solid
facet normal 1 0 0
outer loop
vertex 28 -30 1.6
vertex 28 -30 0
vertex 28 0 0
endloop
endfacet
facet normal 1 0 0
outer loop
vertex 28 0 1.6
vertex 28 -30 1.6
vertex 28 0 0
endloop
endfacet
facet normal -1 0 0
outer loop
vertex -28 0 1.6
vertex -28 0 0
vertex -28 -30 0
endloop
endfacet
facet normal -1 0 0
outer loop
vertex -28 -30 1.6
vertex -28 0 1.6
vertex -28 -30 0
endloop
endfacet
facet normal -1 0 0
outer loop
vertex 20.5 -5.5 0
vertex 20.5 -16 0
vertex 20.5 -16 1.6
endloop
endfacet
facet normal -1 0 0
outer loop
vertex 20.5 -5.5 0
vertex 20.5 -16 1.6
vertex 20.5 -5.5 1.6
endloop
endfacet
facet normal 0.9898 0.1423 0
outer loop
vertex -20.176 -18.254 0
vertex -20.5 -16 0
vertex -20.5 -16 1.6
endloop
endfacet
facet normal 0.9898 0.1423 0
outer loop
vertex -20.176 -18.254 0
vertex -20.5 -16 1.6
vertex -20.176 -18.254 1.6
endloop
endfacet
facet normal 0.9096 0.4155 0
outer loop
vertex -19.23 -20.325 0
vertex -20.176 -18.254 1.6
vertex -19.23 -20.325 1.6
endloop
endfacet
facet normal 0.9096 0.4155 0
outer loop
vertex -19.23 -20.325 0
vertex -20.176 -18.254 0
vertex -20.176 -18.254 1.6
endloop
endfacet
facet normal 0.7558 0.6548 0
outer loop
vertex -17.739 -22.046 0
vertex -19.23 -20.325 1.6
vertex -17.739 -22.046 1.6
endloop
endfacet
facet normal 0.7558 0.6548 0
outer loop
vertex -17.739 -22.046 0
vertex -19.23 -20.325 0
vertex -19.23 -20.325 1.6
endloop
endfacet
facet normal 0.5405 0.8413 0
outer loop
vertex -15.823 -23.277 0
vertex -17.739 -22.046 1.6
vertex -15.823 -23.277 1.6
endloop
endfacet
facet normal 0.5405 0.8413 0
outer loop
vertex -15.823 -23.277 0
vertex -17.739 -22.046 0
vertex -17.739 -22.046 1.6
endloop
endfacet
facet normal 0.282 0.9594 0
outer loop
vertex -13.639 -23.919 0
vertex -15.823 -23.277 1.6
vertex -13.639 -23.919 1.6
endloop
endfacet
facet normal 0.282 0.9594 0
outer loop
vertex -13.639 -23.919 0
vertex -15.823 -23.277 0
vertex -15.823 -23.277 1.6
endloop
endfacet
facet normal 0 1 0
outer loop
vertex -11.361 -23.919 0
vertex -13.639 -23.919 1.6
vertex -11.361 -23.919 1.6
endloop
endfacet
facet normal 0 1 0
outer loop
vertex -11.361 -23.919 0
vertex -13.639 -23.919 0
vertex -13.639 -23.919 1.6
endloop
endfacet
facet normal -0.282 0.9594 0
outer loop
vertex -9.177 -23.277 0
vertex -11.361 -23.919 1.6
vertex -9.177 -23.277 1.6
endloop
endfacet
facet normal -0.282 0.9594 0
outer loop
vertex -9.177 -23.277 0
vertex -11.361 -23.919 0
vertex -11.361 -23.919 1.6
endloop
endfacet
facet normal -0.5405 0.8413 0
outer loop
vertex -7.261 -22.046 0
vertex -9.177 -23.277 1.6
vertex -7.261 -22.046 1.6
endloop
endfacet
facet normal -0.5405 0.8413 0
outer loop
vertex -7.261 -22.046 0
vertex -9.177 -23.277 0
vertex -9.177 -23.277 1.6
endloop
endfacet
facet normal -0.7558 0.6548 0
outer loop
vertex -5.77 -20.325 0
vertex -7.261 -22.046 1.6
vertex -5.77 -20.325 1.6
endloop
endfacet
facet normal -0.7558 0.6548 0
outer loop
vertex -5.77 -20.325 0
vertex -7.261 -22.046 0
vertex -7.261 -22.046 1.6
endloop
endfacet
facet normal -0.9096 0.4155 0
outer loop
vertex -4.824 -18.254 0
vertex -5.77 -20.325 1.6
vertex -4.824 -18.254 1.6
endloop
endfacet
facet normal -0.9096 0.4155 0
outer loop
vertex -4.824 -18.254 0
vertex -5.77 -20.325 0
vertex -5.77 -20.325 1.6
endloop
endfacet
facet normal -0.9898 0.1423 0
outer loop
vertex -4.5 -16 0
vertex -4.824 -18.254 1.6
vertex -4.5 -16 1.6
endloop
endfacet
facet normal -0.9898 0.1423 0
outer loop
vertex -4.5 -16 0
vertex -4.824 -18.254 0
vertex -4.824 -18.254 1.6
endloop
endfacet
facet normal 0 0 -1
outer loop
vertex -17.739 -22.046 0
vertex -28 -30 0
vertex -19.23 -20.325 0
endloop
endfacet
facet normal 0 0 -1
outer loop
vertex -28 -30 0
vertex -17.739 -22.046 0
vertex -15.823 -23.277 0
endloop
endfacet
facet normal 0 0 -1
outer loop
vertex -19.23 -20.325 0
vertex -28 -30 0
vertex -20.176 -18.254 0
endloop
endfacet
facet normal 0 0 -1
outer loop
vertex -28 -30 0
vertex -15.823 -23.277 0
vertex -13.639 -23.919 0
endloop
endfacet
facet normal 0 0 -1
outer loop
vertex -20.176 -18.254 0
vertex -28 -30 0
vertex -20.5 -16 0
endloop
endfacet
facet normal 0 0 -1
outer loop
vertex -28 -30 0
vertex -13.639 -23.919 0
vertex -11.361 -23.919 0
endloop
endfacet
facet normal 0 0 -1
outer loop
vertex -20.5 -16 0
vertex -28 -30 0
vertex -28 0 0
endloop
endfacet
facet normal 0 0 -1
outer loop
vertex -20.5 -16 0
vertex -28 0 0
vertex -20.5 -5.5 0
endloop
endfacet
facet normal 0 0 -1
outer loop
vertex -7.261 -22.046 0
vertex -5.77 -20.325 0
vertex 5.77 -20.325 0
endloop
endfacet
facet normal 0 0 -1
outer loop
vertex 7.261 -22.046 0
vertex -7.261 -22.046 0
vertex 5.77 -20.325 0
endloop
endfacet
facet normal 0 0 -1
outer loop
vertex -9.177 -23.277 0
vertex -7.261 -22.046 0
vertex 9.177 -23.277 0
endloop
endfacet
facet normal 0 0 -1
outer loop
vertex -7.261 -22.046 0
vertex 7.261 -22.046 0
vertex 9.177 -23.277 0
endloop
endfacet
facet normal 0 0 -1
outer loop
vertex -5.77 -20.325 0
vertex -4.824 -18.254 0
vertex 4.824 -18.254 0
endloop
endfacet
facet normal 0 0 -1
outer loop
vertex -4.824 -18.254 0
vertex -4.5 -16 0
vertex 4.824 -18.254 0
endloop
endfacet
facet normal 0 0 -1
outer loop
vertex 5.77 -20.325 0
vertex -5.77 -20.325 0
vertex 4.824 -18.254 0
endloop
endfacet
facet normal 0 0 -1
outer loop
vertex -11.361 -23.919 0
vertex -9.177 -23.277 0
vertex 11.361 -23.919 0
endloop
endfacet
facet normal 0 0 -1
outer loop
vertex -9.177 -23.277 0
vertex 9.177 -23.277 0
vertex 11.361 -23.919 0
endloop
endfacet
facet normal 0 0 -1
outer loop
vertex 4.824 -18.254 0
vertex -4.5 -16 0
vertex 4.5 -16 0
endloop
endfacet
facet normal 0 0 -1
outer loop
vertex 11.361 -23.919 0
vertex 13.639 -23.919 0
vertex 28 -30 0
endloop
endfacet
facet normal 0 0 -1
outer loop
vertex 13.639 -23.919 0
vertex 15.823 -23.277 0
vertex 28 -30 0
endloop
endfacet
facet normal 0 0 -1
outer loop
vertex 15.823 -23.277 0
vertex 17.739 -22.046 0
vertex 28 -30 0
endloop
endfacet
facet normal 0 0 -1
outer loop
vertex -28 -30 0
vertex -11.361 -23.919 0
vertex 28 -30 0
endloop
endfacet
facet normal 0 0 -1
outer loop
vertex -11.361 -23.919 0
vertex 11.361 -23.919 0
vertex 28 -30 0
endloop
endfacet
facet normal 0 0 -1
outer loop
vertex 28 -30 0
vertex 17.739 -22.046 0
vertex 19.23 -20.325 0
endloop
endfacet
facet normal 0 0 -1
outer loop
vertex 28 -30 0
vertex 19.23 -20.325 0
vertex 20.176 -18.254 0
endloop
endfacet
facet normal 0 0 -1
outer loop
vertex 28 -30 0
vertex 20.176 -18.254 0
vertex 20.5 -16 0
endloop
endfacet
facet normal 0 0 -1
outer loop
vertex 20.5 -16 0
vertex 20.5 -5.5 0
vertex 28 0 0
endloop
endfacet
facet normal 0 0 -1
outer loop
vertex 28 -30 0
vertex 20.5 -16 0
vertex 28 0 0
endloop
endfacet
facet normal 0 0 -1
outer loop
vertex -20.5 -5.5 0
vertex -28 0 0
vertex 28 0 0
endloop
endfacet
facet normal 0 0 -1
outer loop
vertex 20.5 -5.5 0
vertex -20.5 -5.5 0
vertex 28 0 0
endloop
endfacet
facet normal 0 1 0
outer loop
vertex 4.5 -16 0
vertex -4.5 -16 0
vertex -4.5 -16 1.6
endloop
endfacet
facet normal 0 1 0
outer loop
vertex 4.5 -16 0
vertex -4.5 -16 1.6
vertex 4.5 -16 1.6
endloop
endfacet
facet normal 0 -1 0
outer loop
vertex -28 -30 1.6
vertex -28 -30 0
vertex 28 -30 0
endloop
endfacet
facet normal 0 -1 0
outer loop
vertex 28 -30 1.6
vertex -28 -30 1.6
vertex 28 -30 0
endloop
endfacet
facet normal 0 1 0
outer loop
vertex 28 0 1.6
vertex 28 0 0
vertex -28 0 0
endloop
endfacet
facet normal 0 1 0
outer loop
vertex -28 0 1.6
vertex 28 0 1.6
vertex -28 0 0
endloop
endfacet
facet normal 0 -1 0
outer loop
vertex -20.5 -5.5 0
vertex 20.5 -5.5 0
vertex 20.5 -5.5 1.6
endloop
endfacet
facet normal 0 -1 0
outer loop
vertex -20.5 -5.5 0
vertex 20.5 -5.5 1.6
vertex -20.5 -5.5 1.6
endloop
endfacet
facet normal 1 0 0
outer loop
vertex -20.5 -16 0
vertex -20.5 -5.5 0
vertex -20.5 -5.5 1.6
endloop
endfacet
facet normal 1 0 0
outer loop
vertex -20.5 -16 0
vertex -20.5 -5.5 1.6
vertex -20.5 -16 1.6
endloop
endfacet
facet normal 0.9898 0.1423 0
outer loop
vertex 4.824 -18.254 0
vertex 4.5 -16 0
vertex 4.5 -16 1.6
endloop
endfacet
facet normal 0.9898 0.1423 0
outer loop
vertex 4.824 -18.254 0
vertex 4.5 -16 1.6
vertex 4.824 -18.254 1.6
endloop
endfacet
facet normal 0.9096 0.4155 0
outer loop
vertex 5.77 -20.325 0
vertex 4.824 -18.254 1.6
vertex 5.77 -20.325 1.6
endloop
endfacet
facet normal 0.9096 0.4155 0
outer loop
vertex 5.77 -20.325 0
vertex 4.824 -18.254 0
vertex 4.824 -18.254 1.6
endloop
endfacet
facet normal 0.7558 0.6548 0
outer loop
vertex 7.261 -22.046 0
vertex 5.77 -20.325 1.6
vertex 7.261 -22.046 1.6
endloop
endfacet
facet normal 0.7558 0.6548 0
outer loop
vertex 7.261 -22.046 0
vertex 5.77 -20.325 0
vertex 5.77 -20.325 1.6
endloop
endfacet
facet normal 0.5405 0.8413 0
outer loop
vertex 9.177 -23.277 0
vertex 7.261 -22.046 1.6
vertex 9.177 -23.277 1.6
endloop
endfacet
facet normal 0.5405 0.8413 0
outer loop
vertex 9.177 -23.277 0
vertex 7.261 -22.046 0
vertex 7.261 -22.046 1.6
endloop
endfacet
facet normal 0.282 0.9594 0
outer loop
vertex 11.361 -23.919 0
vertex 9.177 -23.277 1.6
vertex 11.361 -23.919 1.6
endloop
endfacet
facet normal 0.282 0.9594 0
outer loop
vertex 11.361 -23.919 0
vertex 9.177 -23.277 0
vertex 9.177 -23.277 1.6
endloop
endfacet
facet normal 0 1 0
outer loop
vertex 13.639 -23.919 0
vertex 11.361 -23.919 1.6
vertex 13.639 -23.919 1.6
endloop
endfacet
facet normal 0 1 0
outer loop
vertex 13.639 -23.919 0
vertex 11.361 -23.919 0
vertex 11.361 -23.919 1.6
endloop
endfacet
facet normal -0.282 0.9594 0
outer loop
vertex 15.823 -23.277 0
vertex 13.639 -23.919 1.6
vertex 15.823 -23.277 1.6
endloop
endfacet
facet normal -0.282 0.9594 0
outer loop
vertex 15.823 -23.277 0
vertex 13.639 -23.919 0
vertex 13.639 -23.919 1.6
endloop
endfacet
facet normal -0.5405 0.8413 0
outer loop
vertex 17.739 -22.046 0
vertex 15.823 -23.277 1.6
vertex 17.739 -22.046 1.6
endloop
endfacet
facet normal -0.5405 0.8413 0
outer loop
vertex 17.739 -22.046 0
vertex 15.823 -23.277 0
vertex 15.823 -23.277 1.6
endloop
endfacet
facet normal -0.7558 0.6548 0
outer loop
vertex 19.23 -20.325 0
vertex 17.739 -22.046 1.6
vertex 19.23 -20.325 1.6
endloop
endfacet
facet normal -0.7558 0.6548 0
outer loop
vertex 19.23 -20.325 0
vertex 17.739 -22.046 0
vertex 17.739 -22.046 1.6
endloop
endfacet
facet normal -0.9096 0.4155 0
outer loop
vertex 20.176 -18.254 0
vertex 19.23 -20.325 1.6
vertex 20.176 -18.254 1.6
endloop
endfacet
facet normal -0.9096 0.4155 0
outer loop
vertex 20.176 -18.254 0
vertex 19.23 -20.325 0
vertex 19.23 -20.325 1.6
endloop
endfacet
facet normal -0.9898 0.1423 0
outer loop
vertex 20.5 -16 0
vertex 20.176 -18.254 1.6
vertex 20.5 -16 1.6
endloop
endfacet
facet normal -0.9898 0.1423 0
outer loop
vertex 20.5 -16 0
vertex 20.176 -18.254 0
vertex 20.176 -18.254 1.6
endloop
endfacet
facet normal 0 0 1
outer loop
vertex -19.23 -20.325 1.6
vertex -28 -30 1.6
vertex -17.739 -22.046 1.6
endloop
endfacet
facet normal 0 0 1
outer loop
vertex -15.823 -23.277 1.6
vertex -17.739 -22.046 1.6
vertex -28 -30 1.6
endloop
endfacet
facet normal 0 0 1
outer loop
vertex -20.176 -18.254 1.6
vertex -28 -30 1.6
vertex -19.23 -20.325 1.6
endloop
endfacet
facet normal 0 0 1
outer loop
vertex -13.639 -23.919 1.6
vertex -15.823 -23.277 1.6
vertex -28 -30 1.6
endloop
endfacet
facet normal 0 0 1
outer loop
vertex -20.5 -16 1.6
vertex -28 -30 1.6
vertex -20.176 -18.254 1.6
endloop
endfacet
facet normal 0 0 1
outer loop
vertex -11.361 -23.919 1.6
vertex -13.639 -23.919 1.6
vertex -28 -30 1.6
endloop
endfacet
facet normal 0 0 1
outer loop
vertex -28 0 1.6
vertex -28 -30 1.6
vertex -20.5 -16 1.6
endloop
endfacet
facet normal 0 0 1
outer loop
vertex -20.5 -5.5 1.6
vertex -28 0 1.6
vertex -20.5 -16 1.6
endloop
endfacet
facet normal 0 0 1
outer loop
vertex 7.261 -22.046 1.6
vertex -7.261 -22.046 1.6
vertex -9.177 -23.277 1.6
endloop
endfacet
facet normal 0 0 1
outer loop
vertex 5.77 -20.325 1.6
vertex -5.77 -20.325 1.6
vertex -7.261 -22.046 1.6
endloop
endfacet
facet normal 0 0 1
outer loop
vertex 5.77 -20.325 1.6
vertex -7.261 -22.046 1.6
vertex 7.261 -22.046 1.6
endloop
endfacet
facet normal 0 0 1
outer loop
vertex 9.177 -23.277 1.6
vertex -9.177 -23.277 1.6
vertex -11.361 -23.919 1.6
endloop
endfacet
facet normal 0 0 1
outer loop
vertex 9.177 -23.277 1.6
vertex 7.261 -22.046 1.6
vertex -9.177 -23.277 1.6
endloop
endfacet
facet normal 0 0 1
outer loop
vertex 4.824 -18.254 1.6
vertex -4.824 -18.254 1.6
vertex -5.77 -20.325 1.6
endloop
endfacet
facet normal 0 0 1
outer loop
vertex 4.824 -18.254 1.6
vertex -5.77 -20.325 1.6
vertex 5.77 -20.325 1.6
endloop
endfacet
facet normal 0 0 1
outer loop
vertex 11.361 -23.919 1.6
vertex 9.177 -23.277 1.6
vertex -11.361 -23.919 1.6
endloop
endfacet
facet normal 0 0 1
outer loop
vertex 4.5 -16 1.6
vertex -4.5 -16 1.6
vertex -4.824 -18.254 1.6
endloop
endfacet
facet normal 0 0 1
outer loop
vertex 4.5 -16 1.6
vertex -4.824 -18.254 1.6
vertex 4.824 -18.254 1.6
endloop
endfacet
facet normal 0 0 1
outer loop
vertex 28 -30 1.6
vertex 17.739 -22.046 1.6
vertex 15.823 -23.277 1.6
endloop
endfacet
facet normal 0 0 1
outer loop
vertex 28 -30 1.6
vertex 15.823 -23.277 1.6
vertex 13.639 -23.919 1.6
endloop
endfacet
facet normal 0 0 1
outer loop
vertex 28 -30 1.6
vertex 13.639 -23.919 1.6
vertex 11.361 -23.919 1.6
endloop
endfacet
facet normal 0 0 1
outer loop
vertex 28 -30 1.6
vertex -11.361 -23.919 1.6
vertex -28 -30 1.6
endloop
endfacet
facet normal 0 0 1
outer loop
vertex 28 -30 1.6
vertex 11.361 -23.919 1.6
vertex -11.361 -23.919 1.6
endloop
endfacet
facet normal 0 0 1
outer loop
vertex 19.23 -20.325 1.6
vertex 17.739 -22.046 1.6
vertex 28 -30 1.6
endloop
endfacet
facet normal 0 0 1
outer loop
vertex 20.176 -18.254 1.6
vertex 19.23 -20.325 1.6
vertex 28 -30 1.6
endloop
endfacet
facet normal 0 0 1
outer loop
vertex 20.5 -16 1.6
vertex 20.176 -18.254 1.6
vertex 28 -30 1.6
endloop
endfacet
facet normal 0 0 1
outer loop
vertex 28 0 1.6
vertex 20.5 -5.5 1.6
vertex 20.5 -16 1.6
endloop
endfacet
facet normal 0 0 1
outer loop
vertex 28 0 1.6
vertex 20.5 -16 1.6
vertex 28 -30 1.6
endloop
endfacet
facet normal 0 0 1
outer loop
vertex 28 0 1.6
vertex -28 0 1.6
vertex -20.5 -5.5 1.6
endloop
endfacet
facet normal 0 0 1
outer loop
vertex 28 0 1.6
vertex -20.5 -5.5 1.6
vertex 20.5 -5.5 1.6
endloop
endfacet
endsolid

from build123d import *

# Parameters (mm, degrees)
F1_DEPTH = 1.7
F3_DEPTH = 1.6


with BuildPart() as f1:
    # F0 (on Top) → F1 (new body)
    with BuildSketch(Plane.XY):
        with BuildLine():
            Line((-4.5, -16), (4.5, -16))
            ThreePointArc((4.5, -16), (12.5, -24), (20.5, -16))
            Line((20.5, -16), (20.5, -5.5))
            Line((20.5, -5.5), (-20.5, -5.5))
            Line((-20.5, -5.5), (-20.5, -16))
            ThreePointArc((-20.5, -16), (-12.5, -24), (-4.5, -16))
        make_face()
    extrude(amount=F1_DEPTH)


with BuildPart() as f3:
    # F2 (on Top) → F3 (new body)
    with BuildSketch(Plane.XY):
        Polygon((28, 0), (0, 0), (-28, 0), (-28, -30), (28, -30), align=None)
    extrude(amount=F3_DEPTH)

    # F4: cut F1
    add(f1.part, mode=Mode.SUBTRACT)


solid = f3.part
